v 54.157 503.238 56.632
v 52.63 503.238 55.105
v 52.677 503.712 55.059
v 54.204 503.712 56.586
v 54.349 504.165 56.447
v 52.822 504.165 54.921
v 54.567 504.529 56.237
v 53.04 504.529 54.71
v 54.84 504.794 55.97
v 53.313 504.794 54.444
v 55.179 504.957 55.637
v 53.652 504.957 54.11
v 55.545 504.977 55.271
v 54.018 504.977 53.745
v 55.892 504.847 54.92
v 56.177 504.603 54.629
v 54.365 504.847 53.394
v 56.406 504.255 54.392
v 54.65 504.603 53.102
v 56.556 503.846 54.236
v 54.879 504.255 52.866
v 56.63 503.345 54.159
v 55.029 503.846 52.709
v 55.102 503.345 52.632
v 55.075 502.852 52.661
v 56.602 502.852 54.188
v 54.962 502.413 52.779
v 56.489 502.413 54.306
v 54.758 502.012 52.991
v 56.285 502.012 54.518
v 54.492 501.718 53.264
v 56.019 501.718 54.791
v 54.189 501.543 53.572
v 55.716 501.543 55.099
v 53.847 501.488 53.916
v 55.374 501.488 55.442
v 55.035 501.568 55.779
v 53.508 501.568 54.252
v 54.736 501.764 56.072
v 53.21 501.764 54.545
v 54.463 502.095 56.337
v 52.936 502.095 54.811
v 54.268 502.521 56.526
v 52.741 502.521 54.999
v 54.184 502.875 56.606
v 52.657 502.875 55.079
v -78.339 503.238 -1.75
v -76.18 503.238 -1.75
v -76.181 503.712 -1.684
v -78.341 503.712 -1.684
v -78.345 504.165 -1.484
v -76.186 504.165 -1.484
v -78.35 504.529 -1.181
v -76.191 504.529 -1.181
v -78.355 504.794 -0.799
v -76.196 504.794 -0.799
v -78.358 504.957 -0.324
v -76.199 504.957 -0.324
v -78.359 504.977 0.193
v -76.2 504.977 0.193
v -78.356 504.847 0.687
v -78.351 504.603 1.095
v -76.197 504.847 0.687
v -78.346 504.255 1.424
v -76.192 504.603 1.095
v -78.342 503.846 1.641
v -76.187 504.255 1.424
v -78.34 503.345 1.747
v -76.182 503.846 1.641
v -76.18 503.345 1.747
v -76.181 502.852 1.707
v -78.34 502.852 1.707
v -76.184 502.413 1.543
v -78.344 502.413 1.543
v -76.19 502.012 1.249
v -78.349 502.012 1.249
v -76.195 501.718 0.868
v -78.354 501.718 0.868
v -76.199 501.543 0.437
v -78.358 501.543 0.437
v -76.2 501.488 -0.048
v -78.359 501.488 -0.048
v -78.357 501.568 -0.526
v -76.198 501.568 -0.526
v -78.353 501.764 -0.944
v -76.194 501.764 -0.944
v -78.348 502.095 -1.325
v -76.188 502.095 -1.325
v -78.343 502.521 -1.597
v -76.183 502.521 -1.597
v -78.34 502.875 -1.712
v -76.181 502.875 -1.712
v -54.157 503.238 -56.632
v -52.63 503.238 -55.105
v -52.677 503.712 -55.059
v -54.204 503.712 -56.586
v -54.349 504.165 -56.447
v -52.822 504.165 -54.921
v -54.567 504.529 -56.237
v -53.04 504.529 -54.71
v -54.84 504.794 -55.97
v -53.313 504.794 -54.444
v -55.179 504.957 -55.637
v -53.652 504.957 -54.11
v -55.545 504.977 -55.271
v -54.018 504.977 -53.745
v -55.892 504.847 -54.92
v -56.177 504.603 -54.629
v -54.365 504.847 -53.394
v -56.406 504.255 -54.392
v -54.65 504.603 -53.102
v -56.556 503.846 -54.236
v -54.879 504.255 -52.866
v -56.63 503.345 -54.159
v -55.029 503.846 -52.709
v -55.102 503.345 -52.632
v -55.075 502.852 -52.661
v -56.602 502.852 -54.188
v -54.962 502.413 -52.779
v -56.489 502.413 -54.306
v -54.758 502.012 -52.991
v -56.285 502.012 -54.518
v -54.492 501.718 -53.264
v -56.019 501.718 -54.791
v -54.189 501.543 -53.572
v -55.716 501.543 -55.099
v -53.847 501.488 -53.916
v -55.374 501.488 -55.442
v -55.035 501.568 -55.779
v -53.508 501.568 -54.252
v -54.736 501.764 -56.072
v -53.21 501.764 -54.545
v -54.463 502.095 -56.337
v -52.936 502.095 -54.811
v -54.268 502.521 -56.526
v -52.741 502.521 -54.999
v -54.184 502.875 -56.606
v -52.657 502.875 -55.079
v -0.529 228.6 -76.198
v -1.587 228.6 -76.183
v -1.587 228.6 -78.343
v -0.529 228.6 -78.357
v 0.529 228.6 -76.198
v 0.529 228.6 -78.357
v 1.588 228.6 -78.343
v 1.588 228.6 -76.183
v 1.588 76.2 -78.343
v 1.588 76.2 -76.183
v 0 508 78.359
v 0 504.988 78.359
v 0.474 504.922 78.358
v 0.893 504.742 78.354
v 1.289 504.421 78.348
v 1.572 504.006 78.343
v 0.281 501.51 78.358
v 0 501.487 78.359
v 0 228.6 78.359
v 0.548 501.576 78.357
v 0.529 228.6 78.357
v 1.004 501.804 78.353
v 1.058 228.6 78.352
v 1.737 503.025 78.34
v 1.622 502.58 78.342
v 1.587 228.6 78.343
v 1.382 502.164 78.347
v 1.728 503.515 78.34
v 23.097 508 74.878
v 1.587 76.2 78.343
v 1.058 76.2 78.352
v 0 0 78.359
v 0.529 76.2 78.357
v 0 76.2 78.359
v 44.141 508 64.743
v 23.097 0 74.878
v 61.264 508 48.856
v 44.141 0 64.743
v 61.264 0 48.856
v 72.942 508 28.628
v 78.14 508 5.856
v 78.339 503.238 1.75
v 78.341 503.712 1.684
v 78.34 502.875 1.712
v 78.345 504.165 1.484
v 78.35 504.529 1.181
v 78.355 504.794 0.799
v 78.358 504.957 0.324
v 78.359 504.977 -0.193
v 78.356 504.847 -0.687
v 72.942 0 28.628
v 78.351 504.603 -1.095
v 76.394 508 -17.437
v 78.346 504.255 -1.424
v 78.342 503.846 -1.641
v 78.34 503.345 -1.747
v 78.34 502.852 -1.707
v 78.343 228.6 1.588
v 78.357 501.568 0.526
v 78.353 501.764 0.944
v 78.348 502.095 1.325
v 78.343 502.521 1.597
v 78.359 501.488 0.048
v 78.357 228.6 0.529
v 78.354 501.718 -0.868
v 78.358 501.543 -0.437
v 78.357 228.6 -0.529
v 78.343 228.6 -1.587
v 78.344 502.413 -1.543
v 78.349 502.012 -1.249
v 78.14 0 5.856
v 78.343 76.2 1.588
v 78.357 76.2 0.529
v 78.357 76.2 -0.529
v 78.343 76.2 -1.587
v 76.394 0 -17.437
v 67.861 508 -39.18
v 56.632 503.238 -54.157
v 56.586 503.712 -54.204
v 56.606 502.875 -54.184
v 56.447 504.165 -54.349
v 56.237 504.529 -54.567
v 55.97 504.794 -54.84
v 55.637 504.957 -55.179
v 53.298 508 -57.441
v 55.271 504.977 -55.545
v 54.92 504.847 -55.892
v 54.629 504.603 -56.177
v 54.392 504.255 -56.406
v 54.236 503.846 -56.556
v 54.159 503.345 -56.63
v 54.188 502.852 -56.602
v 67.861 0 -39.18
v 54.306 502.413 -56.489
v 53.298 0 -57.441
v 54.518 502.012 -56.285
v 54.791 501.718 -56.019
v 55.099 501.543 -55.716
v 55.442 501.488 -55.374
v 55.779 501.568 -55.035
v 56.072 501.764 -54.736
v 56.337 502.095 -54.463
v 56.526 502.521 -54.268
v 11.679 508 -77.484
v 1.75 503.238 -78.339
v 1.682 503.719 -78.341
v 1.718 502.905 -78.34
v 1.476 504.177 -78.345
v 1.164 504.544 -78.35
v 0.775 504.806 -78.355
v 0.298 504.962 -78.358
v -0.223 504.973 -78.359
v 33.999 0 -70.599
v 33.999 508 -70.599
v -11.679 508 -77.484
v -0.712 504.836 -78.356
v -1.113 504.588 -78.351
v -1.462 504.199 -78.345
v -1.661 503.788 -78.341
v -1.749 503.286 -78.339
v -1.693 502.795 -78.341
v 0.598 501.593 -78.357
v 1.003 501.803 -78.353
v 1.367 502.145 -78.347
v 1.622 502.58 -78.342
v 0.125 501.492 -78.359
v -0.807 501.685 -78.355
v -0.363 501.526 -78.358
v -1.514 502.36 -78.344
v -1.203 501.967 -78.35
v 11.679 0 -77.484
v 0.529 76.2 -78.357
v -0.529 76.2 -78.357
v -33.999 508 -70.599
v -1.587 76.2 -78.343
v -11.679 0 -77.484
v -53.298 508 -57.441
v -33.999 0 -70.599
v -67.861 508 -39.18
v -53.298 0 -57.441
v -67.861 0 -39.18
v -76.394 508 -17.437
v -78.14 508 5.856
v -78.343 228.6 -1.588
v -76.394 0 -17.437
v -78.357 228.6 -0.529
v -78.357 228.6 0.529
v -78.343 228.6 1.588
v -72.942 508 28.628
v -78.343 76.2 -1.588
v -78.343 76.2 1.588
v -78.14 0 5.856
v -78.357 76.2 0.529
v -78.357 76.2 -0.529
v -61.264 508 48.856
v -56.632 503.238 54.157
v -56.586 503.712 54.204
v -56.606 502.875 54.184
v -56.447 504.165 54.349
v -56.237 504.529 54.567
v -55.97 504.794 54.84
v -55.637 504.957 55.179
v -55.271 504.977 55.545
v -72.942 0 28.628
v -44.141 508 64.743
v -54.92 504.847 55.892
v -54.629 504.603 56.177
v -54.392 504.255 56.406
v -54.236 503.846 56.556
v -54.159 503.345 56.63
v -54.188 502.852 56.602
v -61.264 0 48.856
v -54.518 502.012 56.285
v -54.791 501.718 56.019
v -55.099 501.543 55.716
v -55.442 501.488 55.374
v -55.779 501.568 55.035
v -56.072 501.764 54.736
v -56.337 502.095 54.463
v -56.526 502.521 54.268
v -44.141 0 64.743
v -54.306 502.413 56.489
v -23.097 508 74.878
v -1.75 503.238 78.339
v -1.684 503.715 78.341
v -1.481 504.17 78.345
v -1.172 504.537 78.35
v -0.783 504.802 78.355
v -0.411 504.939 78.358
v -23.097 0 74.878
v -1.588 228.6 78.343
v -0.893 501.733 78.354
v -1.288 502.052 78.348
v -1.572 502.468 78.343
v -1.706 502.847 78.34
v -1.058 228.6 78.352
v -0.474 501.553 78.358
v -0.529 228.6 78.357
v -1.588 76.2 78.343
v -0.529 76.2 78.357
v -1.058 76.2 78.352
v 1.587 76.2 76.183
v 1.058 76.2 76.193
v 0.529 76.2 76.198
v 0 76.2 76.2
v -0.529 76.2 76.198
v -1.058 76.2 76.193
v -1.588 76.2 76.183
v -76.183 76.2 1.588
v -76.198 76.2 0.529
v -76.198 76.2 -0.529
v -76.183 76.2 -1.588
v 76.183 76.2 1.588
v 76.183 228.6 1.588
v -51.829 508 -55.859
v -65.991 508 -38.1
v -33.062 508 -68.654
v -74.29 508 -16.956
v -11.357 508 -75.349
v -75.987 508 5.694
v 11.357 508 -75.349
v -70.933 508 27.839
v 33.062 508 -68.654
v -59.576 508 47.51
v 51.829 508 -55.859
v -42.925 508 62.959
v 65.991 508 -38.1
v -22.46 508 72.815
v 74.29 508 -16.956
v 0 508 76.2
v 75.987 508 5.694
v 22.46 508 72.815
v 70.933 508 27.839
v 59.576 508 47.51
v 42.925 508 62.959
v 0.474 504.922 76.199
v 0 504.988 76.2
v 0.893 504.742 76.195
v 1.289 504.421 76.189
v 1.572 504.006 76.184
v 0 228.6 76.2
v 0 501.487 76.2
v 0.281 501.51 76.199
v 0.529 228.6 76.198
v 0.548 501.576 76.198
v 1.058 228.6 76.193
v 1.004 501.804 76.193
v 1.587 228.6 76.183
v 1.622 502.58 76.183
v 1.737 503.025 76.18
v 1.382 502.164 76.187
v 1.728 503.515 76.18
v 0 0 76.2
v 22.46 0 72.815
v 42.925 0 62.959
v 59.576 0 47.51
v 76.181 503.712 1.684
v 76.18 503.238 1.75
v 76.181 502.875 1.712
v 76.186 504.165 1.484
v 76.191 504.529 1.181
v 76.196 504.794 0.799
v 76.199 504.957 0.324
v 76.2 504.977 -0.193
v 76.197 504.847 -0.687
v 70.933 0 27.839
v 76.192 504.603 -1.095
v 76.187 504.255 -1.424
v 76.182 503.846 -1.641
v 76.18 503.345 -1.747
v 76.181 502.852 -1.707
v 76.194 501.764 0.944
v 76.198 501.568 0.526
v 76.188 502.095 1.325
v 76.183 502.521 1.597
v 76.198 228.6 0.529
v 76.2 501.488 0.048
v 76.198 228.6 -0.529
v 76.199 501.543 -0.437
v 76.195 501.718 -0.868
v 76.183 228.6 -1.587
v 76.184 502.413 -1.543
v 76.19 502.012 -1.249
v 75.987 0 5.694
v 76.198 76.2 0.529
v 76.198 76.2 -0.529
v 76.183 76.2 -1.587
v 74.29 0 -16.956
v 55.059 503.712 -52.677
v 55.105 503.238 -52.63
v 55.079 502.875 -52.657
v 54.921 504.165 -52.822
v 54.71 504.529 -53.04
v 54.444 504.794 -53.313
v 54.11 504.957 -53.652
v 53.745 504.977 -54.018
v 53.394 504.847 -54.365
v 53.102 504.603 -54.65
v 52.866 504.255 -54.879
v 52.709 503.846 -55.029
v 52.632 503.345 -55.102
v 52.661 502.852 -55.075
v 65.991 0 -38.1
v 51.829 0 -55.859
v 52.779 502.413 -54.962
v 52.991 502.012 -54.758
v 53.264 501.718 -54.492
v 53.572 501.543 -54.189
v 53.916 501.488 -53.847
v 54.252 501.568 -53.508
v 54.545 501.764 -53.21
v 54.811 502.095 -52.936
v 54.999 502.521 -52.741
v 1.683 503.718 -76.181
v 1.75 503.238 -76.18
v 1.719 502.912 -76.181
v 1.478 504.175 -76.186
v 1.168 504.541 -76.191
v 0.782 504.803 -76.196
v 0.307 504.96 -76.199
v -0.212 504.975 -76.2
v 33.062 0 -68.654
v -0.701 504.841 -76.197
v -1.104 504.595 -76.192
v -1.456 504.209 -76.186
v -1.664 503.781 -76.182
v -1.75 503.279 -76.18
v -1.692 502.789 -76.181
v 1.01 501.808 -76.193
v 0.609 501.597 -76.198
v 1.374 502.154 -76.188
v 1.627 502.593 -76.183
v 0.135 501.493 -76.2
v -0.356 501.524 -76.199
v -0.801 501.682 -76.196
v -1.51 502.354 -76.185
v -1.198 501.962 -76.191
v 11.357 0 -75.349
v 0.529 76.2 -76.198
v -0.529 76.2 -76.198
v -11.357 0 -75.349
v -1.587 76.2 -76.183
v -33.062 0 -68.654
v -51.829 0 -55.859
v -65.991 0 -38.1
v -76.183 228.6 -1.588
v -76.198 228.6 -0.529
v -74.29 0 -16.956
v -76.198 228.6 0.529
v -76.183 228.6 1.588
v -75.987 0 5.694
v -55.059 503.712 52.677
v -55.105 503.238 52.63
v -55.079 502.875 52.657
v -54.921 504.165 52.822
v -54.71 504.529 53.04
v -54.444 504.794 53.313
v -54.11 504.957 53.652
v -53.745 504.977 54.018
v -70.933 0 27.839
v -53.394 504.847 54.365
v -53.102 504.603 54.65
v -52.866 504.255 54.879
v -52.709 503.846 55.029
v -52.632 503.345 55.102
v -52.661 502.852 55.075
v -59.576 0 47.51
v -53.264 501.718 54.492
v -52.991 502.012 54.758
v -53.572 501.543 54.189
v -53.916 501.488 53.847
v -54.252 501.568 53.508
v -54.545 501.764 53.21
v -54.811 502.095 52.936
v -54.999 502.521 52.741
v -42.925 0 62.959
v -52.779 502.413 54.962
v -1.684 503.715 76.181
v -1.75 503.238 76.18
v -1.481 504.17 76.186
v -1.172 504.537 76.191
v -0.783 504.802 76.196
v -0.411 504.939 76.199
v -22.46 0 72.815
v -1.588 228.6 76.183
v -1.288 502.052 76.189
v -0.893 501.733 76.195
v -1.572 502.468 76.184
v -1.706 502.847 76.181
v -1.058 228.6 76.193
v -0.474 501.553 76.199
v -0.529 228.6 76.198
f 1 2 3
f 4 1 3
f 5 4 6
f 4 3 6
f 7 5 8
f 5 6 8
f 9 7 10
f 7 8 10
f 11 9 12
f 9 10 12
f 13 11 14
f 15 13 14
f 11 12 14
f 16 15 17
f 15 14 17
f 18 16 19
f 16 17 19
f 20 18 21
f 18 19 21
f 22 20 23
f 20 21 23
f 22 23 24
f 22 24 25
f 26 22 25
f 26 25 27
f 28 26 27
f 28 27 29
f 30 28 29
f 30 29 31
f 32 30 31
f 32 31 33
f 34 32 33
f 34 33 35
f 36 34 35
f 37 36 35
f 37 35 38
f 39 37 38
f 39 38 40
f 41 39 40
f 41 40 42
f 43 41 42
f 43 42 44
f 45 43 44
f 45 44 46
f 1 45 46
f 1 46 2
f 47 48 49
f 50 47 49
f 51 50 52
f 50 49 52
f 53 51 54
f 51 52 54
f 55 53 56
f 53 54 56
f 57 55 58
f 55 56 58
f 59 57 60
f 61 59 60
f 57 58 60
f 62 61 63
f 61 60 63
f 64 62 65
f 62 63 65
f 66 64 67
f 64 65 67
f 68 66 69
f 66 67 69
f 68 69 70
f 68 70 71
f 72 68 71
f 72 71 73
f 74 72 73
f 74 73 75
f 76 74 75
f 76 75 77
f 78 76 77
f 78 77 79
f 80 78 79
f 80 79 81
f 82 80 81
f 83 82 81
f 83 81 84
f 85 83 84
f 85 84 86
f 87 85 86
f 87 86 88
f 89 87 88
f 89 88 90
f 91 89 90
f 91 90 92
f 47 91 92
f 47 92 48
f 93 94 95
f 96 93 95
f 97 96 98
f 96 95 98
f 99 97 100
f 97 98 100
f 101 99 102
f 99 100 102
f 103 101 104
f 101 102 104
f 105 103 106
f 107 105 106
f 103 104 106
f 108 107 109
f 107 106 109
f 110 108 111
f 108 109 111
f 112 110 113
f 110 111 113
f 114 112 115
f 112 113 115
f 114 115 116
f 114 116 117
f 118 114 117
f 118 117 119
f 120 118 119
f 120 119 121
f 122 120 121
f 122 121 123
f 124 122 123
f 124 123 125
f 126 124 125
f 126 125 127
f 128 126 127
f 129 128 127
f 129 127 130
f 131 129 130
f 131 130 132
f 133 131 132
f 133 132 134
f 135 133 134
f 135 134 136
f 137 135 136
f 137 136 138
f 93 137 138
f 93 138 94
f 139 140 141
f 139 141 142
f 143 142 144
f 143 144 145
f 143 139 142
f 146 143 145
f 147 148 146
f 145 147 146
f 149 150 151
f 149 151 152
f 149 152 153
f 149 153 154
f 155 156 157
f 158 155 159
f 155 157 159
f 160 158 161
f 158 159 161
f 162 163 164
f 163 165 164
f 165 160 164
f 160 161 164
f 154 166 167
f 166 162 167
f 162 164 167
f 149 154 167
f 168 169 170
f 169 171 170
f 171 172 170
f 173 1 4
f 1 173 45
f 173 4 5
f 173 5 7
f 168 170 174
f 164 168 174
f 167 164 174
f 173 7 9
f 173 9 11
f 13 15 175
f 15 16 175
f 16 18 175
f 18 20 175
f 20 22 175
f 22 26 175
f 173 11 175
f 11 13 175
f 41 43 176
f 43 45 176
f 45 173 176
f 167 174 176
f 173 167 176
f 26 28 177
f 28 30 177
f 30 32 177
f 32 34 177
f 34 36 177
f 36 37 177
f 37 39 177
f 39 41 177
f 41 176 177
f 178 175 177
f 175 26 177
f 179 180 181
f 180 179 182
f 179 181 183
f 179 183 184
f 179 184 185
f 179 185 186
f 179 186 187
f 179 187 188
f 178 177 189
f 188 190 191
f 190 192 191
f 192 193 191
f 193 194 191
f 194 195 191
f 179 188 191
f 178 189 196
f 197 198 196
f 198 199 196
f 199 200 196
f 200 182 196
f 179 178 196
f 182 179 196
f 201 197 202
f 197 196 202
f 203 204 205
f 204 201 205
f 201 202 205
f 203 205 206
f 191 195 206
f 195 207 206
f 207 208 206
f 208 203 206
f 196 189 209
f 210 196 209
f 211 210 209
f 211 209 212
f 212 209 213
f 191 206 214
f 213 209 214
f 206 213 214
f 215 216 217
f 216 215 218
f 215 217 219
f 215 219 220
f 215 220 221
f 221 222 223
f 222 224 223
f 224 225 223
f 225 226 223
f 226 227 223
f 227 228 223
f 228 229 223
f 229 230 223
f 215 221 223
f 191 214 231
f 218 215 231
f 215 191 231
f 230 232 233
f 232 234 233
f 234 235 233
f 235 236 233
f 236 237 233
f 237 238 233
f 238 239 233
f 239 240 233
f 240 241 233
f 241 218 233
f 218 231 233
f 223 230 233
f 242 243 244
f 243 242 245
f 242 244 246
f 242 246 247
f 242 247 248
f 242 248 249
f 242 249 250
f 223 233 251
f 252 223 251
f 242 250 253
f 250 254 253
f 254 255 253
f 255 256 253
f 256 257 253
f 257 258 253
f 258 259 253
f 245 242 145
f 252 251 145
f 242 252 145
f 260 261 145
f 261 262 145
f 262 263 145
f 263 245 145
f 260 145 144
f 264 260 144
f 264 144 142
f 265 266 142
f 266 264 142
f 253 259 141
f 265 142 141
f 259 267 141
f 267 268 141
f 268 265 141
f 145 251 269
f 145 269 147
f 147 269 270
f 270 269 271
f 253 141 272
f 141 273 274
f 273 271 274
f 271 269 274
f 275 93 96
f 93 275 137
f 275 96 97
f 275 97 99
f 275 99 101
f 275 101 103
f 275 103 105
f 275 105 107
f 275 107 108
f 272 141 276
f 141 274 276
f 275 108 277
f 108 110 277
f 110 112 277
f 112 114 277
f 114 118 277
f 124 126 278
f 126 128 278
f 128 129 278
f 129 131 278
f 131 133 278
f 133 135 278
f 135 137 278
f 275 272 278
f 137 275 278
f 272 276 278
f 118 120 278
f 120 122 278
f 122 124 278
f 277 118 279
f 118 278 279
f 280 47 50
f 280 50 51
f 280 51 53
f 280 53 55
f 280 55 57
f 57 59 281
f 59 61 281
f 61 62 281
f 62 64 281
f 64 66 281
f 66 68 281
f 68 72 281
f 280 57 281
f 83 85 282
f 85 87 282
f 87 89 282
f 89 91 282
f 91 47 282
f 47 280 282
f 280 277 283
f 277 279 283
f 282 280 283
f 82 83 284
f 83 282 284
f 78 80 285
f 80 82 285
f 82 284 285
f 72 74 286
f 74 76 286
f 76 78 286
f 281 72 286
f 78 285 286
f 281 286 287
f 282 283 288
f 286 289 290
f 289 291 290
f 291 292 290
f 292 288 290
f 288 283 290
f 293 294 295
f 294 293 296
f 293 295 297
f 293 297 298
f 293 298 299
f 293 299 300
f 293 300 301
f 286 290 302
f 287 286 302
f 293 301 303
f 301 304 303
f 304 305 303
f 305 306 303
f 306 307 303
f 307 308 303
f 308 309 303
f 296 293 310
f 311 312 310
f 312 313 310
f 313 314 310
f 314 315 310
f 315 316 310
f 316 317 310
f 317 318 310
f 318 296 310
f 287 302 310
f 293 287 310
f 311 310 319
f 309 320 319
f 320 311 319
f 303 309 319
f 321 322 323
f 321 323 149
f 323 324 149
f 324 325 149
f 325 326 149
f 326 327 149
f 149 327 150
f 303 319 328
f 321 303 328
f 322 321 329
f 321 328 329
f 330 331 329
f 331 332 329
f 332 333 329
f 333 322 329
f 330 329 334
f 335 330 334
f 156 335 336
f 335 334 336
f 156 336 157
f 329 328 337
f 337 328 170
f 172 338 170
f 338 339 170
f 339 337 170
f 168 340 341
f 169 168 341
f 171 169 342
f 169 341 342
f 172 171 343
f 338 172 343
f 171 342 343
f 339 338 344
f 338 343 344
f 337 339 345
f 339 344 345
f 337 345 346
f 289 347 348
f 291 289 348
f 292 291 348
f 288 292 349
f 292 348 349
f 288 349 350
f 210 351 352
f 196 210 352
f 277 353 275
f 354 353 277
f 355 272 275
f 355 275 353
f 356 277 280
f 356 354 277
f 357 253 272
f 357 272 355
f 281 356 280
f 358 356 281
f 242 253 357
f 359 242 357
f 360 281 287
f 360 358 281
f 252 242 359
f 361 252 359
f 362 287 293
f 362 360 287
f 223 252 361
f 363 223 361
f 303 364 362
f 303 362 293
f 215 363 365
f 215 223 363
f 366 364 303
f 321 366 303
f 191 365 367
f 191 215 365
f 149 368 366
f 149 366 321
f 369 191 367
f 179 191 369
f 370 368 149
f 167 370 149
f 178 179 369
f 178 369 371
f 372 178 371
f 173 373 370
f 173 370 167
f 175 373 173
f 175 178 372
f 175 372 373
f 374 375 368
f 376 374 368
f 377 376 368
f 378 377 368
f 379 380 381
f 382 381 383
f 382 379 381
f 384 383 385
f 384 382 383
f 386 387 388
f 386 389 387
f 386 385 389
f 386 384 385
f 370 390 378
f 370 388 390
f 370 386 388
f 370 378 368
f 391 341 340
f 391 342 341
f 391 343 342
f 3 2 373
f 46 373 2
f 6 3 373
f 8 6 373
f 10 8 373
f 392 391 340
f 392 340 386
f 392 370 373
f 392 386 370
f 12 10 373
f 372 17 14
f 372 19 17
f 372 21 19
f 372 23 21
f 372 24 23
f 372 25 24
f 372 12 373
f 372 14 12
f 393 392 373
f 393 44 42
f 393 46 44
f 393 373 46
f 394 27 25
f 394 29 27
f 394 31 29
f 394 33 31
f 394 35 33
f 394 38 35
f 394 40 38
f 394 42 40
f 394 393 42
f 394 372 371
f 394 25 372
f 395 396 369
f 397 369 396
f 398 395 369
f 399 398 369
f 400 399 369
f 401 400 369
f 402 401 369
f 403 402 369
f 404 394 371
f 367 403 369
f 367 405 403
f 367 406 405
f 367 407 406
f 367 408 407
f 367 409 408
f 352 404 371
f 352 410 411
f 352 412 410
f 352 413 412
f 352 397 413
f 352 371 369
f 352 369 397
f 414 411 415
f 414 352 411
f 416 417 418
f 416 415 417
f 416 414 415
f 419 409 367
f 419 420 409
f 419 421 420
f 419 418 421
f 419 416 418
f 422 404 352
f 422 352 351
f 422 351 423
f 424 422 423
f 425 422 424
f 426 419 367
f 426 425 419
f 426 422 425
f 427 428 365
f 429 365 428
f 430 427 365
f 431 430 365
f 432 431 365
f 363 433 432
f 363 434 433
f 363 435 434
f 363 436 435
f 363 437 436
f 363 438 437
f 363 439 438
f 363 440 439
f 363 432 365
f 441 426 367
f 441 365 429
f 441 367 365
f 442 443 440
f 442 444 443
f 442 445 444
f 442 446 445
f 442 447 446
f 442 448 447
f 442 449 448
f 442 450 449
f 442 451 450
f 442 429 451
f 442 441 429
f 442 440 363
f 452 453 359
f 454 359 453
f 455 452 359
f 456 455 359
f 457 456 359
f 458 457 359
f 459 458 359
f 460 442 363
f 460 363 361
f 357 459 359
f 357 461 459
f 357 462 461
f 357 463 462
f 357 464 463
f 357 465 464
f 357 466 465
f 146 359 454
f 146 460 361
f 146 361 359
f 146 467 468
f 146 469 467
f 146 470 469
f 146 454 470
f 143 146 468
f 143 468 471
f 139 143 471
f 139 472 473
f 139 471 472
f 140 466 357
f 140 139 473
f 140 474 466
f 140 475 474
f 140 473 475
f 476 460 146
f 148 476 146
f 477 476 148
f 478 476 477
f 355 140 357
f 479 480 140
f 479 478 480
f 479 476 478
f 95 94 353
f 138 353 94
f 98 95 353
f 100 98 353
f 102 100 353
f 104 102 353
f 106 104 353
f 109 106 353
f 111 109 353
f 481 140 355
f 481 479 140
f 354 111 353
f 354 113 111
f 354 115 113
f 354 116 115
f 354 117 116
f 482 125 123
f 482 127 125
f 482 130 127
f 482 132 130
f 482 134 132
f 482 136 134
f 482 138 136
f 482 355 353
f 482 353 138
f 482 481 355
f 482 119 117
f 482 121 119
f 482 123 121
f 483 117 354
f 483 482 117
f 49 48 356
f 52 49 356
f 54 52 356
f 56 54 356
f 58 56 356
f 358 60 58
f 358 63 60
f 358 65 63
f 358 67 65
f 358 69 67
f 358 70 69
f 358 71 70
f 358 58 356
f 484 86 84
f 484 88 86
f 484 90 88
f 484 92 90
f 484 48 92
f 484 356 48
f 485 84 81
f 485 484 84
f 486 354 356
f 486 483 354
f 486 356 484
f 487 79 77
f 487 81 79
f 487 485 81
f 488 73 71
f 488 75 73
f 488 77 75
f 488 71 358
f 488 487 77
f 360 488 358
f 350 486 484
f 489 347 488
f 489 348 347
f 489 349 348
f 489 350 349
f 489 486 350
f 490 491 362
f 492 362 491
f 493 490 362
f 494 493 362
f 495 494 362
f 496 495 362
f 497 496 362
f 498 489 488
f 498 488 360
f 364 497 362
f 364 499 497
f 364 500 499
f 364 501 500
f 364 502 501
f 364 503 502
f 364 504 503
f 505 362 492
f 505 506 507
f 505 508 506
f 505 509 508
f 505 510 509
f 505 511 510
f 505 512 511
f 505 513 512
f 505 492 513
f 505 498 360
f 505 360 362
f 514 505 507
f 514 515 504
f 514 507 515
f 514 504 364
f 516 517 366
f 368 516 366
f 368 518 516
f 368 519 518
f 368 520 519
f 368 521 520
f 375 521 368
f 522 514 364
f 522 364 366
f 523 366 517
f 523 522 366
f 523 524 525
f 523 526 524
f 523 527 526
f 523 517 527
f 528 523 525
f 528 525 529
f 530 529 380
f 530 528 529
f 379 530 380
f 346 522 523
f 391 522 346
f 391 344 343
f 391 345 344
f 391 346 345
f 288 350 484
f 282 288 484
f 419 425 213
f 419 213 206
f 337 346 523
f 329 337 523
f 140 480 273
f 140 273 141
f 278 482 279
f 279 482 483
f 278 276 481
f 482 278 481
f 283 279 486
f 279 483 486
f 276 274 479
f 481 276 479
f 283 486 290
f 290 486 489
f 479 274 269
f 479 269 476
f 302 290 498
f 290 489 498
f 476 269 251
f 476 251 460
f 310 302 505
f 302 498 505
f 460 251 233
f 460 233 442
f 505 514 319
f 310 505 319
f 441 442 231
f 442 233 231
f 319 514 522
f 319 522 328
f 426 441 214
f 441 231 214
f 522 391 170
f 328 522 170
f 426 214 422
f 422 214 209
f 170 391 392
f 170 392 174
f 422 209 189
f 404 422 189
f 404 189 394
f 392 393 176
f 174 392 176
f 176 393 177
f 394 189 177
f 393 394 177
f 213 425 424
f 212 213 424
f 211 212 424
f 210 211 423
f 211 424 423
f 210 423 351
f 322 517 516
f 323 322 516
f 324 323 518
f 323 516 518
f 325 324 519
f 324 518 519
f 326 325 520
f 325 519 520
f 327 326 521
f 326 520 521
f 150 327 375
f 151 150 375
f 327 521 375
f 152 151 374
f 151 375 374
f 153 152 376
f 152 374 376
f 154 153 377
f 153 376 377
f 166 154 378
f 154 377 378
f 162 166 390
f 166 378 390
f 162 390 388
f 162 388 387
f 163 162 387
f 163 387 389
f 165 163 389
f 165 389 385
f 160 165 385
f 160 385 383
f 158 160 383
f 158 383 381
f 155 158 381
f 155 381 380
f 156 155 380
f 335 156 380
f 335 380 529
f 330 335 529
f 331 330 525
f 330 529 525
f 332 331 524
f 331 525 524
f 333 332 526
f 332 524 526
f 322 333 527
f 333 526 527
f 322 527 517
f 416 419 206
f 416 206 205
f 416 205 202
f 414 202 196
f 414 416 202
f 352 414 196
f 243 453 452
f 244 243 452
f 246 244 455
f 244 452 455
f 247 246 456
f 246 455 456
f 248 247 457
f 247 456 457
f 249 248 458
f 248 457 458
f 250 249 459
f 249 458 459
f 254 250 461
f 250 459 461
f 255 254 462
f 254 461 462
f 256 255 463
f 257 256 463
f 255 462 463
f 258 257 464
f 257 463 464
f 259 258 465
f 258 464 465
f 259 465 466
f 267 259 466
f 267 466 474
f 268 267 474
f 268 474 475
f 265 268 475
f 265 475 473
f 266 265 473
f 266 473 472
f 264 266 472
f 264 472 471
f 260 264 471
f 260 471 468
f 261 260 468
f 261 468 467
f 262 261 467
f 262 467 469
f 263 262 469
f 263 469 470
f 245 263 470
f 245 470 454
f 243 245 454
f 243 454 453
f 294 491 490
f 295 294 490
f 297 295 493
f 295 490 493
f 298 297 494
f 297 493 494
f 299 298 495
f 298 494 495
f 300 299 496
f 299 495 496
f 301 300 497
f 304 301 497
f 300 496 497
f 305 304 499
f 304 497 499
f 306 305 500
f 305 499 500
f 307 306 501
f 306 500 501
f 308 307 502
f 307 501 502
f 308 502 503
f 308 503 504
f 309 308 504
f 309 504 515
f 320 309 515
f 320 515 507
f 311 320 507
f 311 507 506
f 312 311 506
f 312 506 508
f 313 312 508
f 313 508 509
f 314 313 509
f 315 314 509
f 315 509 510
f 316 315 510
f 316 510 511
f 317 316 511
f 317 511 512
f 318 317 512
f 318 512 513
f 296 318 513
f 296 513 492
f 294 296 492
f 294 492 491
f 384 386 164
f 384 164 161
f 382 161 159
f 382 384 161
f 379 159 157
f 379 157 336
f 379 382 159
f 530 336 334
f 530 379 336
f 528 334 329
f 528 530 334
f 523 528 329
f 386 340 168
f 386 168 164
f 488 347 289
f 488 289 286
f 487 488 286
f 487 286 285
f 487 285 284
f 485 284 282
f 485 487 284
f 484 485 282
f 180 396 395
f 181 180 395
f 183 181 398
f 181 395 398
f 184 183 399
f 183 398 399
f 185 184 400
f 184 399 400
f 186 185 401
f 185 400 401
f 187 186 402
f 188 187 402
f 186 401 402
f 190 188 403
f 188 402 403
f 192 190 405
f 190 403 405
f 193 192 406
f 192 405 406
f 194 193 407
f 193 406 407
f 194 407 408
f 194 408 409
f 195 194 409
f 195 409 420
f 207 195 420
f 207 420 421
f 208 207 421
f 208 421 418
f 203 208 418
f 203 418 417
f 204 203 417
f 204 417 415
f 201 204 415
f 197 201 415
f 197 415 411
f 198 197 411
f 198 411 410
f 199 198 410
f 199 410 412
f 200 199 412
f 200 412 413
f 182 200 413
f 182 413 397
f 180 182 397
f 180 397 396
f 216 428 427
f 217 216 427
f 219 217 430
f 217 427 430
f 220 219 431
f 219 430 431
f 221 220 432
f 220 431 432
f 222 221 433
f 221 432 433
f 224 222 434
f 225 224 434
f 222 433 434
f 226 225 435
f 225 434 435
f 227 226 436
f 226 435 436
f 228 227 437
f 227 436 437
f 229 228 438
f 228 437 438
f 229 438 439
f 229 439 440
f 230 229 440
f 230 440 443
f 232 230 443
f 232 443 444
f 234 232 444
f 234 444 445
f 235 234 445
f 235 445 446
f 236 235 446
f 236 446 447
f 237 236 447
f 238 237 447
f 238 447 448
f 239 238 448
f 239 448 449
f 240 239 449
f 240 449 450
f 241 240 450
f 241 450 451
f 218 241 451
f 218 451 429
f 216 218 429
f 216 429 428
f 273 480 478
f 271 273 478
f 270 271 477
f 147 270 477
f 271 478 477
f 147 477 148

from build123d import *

# Parameters (mm, degrees)
SKETCH1_R           = 78.359
SKETCH1_R_2         = 76.2
BOSS_EXTRUDE1_DEPTH = 508
CUT_EXTRUDE1_DEPTH  = 520.946406625
CIRPATTERN1_COUNT   = 4
CUT_EXTRUDE2_DEPTH  = 520.946406625
CIRPATTERN2_COUNT   = 8


with BuildPart() as part:
    # Sketch1 → Boss-Extrude1 (new body)
    with BuildSketch(Plane(origin=(0, 0, 0), x_dir=(1, 0, 0), z_dir=(0, 1, 0))):
        Circle(SKETCH1_R)
        Circle(SKETCH1_R_2, mode=Mode.SUBTRACT)
    extrude(amount=BOSS_EXTRUDE1_DEPTH)

    # Sketch2 → Cut-Extrude1 (cut, through all)
    with BuildSketch(Plane(origin=(0, 0, 0), x_dir=(0, 0, -1), z_dir=(1, 0, 0))):
        Polygon((0, 76.2), (1.5875, 76.2), (1.5875, 228.6), (-1.5875, 228.6), (-1.5875, 76.2), align=None)
    cut_extrude1 = extrude(amount=-CUT_EXTRUDE1_DEPTH, mode=Mode.SUBTRACT)

    # CirPattern1: Cut-Extrude1 ×4 about axis
    cirpattern1_axis = Axis((0, 0, 0), (0, 1, 0))
    for i in range(1, CIRPATTERN1_COUNT):
        add(cut_extrude1.rotate(cirpattern1_axis, i * 360 / CIRPATTERN1_COUNT), mode=Mode.SUBTRACT)

    # Sketch2<3> → Cut-Extrude2 (cut, through all)
    with BuildSketch(Plane(origin=(0, 0, 0), x_dir=(0, 0, -1), z_dir=(1, 0, 0))):
        with BuildLine():
            ThreePointArc((0, 504.987500056), (-1.237436907, 502.000063093), (1.750000056, 503.2375))
            ThreePointArc((1.750000056, 503.2375), (1.237436907, 504.474936907), (0, 504.987500056))
        make_face()
    cut_extrude2 = extrude(amount=-CUT_EXTRUDE2_DEPTH, mode=Mode.SUBTRACT)

    # CirPattern2: Cut-Extrude2 ×8 about axis
    cirpattern2_axis = Axis((0, 508, 0), (0, -1, 0))
    for i in range(1, CIRPATTERN2_COUNT):
        add(cut_extrude2.rotate(cirpattern2_axis, i * 360 / CIRPATTERN2_COUNT), mode=Mode.SUBTRACT)


solid = part.part
